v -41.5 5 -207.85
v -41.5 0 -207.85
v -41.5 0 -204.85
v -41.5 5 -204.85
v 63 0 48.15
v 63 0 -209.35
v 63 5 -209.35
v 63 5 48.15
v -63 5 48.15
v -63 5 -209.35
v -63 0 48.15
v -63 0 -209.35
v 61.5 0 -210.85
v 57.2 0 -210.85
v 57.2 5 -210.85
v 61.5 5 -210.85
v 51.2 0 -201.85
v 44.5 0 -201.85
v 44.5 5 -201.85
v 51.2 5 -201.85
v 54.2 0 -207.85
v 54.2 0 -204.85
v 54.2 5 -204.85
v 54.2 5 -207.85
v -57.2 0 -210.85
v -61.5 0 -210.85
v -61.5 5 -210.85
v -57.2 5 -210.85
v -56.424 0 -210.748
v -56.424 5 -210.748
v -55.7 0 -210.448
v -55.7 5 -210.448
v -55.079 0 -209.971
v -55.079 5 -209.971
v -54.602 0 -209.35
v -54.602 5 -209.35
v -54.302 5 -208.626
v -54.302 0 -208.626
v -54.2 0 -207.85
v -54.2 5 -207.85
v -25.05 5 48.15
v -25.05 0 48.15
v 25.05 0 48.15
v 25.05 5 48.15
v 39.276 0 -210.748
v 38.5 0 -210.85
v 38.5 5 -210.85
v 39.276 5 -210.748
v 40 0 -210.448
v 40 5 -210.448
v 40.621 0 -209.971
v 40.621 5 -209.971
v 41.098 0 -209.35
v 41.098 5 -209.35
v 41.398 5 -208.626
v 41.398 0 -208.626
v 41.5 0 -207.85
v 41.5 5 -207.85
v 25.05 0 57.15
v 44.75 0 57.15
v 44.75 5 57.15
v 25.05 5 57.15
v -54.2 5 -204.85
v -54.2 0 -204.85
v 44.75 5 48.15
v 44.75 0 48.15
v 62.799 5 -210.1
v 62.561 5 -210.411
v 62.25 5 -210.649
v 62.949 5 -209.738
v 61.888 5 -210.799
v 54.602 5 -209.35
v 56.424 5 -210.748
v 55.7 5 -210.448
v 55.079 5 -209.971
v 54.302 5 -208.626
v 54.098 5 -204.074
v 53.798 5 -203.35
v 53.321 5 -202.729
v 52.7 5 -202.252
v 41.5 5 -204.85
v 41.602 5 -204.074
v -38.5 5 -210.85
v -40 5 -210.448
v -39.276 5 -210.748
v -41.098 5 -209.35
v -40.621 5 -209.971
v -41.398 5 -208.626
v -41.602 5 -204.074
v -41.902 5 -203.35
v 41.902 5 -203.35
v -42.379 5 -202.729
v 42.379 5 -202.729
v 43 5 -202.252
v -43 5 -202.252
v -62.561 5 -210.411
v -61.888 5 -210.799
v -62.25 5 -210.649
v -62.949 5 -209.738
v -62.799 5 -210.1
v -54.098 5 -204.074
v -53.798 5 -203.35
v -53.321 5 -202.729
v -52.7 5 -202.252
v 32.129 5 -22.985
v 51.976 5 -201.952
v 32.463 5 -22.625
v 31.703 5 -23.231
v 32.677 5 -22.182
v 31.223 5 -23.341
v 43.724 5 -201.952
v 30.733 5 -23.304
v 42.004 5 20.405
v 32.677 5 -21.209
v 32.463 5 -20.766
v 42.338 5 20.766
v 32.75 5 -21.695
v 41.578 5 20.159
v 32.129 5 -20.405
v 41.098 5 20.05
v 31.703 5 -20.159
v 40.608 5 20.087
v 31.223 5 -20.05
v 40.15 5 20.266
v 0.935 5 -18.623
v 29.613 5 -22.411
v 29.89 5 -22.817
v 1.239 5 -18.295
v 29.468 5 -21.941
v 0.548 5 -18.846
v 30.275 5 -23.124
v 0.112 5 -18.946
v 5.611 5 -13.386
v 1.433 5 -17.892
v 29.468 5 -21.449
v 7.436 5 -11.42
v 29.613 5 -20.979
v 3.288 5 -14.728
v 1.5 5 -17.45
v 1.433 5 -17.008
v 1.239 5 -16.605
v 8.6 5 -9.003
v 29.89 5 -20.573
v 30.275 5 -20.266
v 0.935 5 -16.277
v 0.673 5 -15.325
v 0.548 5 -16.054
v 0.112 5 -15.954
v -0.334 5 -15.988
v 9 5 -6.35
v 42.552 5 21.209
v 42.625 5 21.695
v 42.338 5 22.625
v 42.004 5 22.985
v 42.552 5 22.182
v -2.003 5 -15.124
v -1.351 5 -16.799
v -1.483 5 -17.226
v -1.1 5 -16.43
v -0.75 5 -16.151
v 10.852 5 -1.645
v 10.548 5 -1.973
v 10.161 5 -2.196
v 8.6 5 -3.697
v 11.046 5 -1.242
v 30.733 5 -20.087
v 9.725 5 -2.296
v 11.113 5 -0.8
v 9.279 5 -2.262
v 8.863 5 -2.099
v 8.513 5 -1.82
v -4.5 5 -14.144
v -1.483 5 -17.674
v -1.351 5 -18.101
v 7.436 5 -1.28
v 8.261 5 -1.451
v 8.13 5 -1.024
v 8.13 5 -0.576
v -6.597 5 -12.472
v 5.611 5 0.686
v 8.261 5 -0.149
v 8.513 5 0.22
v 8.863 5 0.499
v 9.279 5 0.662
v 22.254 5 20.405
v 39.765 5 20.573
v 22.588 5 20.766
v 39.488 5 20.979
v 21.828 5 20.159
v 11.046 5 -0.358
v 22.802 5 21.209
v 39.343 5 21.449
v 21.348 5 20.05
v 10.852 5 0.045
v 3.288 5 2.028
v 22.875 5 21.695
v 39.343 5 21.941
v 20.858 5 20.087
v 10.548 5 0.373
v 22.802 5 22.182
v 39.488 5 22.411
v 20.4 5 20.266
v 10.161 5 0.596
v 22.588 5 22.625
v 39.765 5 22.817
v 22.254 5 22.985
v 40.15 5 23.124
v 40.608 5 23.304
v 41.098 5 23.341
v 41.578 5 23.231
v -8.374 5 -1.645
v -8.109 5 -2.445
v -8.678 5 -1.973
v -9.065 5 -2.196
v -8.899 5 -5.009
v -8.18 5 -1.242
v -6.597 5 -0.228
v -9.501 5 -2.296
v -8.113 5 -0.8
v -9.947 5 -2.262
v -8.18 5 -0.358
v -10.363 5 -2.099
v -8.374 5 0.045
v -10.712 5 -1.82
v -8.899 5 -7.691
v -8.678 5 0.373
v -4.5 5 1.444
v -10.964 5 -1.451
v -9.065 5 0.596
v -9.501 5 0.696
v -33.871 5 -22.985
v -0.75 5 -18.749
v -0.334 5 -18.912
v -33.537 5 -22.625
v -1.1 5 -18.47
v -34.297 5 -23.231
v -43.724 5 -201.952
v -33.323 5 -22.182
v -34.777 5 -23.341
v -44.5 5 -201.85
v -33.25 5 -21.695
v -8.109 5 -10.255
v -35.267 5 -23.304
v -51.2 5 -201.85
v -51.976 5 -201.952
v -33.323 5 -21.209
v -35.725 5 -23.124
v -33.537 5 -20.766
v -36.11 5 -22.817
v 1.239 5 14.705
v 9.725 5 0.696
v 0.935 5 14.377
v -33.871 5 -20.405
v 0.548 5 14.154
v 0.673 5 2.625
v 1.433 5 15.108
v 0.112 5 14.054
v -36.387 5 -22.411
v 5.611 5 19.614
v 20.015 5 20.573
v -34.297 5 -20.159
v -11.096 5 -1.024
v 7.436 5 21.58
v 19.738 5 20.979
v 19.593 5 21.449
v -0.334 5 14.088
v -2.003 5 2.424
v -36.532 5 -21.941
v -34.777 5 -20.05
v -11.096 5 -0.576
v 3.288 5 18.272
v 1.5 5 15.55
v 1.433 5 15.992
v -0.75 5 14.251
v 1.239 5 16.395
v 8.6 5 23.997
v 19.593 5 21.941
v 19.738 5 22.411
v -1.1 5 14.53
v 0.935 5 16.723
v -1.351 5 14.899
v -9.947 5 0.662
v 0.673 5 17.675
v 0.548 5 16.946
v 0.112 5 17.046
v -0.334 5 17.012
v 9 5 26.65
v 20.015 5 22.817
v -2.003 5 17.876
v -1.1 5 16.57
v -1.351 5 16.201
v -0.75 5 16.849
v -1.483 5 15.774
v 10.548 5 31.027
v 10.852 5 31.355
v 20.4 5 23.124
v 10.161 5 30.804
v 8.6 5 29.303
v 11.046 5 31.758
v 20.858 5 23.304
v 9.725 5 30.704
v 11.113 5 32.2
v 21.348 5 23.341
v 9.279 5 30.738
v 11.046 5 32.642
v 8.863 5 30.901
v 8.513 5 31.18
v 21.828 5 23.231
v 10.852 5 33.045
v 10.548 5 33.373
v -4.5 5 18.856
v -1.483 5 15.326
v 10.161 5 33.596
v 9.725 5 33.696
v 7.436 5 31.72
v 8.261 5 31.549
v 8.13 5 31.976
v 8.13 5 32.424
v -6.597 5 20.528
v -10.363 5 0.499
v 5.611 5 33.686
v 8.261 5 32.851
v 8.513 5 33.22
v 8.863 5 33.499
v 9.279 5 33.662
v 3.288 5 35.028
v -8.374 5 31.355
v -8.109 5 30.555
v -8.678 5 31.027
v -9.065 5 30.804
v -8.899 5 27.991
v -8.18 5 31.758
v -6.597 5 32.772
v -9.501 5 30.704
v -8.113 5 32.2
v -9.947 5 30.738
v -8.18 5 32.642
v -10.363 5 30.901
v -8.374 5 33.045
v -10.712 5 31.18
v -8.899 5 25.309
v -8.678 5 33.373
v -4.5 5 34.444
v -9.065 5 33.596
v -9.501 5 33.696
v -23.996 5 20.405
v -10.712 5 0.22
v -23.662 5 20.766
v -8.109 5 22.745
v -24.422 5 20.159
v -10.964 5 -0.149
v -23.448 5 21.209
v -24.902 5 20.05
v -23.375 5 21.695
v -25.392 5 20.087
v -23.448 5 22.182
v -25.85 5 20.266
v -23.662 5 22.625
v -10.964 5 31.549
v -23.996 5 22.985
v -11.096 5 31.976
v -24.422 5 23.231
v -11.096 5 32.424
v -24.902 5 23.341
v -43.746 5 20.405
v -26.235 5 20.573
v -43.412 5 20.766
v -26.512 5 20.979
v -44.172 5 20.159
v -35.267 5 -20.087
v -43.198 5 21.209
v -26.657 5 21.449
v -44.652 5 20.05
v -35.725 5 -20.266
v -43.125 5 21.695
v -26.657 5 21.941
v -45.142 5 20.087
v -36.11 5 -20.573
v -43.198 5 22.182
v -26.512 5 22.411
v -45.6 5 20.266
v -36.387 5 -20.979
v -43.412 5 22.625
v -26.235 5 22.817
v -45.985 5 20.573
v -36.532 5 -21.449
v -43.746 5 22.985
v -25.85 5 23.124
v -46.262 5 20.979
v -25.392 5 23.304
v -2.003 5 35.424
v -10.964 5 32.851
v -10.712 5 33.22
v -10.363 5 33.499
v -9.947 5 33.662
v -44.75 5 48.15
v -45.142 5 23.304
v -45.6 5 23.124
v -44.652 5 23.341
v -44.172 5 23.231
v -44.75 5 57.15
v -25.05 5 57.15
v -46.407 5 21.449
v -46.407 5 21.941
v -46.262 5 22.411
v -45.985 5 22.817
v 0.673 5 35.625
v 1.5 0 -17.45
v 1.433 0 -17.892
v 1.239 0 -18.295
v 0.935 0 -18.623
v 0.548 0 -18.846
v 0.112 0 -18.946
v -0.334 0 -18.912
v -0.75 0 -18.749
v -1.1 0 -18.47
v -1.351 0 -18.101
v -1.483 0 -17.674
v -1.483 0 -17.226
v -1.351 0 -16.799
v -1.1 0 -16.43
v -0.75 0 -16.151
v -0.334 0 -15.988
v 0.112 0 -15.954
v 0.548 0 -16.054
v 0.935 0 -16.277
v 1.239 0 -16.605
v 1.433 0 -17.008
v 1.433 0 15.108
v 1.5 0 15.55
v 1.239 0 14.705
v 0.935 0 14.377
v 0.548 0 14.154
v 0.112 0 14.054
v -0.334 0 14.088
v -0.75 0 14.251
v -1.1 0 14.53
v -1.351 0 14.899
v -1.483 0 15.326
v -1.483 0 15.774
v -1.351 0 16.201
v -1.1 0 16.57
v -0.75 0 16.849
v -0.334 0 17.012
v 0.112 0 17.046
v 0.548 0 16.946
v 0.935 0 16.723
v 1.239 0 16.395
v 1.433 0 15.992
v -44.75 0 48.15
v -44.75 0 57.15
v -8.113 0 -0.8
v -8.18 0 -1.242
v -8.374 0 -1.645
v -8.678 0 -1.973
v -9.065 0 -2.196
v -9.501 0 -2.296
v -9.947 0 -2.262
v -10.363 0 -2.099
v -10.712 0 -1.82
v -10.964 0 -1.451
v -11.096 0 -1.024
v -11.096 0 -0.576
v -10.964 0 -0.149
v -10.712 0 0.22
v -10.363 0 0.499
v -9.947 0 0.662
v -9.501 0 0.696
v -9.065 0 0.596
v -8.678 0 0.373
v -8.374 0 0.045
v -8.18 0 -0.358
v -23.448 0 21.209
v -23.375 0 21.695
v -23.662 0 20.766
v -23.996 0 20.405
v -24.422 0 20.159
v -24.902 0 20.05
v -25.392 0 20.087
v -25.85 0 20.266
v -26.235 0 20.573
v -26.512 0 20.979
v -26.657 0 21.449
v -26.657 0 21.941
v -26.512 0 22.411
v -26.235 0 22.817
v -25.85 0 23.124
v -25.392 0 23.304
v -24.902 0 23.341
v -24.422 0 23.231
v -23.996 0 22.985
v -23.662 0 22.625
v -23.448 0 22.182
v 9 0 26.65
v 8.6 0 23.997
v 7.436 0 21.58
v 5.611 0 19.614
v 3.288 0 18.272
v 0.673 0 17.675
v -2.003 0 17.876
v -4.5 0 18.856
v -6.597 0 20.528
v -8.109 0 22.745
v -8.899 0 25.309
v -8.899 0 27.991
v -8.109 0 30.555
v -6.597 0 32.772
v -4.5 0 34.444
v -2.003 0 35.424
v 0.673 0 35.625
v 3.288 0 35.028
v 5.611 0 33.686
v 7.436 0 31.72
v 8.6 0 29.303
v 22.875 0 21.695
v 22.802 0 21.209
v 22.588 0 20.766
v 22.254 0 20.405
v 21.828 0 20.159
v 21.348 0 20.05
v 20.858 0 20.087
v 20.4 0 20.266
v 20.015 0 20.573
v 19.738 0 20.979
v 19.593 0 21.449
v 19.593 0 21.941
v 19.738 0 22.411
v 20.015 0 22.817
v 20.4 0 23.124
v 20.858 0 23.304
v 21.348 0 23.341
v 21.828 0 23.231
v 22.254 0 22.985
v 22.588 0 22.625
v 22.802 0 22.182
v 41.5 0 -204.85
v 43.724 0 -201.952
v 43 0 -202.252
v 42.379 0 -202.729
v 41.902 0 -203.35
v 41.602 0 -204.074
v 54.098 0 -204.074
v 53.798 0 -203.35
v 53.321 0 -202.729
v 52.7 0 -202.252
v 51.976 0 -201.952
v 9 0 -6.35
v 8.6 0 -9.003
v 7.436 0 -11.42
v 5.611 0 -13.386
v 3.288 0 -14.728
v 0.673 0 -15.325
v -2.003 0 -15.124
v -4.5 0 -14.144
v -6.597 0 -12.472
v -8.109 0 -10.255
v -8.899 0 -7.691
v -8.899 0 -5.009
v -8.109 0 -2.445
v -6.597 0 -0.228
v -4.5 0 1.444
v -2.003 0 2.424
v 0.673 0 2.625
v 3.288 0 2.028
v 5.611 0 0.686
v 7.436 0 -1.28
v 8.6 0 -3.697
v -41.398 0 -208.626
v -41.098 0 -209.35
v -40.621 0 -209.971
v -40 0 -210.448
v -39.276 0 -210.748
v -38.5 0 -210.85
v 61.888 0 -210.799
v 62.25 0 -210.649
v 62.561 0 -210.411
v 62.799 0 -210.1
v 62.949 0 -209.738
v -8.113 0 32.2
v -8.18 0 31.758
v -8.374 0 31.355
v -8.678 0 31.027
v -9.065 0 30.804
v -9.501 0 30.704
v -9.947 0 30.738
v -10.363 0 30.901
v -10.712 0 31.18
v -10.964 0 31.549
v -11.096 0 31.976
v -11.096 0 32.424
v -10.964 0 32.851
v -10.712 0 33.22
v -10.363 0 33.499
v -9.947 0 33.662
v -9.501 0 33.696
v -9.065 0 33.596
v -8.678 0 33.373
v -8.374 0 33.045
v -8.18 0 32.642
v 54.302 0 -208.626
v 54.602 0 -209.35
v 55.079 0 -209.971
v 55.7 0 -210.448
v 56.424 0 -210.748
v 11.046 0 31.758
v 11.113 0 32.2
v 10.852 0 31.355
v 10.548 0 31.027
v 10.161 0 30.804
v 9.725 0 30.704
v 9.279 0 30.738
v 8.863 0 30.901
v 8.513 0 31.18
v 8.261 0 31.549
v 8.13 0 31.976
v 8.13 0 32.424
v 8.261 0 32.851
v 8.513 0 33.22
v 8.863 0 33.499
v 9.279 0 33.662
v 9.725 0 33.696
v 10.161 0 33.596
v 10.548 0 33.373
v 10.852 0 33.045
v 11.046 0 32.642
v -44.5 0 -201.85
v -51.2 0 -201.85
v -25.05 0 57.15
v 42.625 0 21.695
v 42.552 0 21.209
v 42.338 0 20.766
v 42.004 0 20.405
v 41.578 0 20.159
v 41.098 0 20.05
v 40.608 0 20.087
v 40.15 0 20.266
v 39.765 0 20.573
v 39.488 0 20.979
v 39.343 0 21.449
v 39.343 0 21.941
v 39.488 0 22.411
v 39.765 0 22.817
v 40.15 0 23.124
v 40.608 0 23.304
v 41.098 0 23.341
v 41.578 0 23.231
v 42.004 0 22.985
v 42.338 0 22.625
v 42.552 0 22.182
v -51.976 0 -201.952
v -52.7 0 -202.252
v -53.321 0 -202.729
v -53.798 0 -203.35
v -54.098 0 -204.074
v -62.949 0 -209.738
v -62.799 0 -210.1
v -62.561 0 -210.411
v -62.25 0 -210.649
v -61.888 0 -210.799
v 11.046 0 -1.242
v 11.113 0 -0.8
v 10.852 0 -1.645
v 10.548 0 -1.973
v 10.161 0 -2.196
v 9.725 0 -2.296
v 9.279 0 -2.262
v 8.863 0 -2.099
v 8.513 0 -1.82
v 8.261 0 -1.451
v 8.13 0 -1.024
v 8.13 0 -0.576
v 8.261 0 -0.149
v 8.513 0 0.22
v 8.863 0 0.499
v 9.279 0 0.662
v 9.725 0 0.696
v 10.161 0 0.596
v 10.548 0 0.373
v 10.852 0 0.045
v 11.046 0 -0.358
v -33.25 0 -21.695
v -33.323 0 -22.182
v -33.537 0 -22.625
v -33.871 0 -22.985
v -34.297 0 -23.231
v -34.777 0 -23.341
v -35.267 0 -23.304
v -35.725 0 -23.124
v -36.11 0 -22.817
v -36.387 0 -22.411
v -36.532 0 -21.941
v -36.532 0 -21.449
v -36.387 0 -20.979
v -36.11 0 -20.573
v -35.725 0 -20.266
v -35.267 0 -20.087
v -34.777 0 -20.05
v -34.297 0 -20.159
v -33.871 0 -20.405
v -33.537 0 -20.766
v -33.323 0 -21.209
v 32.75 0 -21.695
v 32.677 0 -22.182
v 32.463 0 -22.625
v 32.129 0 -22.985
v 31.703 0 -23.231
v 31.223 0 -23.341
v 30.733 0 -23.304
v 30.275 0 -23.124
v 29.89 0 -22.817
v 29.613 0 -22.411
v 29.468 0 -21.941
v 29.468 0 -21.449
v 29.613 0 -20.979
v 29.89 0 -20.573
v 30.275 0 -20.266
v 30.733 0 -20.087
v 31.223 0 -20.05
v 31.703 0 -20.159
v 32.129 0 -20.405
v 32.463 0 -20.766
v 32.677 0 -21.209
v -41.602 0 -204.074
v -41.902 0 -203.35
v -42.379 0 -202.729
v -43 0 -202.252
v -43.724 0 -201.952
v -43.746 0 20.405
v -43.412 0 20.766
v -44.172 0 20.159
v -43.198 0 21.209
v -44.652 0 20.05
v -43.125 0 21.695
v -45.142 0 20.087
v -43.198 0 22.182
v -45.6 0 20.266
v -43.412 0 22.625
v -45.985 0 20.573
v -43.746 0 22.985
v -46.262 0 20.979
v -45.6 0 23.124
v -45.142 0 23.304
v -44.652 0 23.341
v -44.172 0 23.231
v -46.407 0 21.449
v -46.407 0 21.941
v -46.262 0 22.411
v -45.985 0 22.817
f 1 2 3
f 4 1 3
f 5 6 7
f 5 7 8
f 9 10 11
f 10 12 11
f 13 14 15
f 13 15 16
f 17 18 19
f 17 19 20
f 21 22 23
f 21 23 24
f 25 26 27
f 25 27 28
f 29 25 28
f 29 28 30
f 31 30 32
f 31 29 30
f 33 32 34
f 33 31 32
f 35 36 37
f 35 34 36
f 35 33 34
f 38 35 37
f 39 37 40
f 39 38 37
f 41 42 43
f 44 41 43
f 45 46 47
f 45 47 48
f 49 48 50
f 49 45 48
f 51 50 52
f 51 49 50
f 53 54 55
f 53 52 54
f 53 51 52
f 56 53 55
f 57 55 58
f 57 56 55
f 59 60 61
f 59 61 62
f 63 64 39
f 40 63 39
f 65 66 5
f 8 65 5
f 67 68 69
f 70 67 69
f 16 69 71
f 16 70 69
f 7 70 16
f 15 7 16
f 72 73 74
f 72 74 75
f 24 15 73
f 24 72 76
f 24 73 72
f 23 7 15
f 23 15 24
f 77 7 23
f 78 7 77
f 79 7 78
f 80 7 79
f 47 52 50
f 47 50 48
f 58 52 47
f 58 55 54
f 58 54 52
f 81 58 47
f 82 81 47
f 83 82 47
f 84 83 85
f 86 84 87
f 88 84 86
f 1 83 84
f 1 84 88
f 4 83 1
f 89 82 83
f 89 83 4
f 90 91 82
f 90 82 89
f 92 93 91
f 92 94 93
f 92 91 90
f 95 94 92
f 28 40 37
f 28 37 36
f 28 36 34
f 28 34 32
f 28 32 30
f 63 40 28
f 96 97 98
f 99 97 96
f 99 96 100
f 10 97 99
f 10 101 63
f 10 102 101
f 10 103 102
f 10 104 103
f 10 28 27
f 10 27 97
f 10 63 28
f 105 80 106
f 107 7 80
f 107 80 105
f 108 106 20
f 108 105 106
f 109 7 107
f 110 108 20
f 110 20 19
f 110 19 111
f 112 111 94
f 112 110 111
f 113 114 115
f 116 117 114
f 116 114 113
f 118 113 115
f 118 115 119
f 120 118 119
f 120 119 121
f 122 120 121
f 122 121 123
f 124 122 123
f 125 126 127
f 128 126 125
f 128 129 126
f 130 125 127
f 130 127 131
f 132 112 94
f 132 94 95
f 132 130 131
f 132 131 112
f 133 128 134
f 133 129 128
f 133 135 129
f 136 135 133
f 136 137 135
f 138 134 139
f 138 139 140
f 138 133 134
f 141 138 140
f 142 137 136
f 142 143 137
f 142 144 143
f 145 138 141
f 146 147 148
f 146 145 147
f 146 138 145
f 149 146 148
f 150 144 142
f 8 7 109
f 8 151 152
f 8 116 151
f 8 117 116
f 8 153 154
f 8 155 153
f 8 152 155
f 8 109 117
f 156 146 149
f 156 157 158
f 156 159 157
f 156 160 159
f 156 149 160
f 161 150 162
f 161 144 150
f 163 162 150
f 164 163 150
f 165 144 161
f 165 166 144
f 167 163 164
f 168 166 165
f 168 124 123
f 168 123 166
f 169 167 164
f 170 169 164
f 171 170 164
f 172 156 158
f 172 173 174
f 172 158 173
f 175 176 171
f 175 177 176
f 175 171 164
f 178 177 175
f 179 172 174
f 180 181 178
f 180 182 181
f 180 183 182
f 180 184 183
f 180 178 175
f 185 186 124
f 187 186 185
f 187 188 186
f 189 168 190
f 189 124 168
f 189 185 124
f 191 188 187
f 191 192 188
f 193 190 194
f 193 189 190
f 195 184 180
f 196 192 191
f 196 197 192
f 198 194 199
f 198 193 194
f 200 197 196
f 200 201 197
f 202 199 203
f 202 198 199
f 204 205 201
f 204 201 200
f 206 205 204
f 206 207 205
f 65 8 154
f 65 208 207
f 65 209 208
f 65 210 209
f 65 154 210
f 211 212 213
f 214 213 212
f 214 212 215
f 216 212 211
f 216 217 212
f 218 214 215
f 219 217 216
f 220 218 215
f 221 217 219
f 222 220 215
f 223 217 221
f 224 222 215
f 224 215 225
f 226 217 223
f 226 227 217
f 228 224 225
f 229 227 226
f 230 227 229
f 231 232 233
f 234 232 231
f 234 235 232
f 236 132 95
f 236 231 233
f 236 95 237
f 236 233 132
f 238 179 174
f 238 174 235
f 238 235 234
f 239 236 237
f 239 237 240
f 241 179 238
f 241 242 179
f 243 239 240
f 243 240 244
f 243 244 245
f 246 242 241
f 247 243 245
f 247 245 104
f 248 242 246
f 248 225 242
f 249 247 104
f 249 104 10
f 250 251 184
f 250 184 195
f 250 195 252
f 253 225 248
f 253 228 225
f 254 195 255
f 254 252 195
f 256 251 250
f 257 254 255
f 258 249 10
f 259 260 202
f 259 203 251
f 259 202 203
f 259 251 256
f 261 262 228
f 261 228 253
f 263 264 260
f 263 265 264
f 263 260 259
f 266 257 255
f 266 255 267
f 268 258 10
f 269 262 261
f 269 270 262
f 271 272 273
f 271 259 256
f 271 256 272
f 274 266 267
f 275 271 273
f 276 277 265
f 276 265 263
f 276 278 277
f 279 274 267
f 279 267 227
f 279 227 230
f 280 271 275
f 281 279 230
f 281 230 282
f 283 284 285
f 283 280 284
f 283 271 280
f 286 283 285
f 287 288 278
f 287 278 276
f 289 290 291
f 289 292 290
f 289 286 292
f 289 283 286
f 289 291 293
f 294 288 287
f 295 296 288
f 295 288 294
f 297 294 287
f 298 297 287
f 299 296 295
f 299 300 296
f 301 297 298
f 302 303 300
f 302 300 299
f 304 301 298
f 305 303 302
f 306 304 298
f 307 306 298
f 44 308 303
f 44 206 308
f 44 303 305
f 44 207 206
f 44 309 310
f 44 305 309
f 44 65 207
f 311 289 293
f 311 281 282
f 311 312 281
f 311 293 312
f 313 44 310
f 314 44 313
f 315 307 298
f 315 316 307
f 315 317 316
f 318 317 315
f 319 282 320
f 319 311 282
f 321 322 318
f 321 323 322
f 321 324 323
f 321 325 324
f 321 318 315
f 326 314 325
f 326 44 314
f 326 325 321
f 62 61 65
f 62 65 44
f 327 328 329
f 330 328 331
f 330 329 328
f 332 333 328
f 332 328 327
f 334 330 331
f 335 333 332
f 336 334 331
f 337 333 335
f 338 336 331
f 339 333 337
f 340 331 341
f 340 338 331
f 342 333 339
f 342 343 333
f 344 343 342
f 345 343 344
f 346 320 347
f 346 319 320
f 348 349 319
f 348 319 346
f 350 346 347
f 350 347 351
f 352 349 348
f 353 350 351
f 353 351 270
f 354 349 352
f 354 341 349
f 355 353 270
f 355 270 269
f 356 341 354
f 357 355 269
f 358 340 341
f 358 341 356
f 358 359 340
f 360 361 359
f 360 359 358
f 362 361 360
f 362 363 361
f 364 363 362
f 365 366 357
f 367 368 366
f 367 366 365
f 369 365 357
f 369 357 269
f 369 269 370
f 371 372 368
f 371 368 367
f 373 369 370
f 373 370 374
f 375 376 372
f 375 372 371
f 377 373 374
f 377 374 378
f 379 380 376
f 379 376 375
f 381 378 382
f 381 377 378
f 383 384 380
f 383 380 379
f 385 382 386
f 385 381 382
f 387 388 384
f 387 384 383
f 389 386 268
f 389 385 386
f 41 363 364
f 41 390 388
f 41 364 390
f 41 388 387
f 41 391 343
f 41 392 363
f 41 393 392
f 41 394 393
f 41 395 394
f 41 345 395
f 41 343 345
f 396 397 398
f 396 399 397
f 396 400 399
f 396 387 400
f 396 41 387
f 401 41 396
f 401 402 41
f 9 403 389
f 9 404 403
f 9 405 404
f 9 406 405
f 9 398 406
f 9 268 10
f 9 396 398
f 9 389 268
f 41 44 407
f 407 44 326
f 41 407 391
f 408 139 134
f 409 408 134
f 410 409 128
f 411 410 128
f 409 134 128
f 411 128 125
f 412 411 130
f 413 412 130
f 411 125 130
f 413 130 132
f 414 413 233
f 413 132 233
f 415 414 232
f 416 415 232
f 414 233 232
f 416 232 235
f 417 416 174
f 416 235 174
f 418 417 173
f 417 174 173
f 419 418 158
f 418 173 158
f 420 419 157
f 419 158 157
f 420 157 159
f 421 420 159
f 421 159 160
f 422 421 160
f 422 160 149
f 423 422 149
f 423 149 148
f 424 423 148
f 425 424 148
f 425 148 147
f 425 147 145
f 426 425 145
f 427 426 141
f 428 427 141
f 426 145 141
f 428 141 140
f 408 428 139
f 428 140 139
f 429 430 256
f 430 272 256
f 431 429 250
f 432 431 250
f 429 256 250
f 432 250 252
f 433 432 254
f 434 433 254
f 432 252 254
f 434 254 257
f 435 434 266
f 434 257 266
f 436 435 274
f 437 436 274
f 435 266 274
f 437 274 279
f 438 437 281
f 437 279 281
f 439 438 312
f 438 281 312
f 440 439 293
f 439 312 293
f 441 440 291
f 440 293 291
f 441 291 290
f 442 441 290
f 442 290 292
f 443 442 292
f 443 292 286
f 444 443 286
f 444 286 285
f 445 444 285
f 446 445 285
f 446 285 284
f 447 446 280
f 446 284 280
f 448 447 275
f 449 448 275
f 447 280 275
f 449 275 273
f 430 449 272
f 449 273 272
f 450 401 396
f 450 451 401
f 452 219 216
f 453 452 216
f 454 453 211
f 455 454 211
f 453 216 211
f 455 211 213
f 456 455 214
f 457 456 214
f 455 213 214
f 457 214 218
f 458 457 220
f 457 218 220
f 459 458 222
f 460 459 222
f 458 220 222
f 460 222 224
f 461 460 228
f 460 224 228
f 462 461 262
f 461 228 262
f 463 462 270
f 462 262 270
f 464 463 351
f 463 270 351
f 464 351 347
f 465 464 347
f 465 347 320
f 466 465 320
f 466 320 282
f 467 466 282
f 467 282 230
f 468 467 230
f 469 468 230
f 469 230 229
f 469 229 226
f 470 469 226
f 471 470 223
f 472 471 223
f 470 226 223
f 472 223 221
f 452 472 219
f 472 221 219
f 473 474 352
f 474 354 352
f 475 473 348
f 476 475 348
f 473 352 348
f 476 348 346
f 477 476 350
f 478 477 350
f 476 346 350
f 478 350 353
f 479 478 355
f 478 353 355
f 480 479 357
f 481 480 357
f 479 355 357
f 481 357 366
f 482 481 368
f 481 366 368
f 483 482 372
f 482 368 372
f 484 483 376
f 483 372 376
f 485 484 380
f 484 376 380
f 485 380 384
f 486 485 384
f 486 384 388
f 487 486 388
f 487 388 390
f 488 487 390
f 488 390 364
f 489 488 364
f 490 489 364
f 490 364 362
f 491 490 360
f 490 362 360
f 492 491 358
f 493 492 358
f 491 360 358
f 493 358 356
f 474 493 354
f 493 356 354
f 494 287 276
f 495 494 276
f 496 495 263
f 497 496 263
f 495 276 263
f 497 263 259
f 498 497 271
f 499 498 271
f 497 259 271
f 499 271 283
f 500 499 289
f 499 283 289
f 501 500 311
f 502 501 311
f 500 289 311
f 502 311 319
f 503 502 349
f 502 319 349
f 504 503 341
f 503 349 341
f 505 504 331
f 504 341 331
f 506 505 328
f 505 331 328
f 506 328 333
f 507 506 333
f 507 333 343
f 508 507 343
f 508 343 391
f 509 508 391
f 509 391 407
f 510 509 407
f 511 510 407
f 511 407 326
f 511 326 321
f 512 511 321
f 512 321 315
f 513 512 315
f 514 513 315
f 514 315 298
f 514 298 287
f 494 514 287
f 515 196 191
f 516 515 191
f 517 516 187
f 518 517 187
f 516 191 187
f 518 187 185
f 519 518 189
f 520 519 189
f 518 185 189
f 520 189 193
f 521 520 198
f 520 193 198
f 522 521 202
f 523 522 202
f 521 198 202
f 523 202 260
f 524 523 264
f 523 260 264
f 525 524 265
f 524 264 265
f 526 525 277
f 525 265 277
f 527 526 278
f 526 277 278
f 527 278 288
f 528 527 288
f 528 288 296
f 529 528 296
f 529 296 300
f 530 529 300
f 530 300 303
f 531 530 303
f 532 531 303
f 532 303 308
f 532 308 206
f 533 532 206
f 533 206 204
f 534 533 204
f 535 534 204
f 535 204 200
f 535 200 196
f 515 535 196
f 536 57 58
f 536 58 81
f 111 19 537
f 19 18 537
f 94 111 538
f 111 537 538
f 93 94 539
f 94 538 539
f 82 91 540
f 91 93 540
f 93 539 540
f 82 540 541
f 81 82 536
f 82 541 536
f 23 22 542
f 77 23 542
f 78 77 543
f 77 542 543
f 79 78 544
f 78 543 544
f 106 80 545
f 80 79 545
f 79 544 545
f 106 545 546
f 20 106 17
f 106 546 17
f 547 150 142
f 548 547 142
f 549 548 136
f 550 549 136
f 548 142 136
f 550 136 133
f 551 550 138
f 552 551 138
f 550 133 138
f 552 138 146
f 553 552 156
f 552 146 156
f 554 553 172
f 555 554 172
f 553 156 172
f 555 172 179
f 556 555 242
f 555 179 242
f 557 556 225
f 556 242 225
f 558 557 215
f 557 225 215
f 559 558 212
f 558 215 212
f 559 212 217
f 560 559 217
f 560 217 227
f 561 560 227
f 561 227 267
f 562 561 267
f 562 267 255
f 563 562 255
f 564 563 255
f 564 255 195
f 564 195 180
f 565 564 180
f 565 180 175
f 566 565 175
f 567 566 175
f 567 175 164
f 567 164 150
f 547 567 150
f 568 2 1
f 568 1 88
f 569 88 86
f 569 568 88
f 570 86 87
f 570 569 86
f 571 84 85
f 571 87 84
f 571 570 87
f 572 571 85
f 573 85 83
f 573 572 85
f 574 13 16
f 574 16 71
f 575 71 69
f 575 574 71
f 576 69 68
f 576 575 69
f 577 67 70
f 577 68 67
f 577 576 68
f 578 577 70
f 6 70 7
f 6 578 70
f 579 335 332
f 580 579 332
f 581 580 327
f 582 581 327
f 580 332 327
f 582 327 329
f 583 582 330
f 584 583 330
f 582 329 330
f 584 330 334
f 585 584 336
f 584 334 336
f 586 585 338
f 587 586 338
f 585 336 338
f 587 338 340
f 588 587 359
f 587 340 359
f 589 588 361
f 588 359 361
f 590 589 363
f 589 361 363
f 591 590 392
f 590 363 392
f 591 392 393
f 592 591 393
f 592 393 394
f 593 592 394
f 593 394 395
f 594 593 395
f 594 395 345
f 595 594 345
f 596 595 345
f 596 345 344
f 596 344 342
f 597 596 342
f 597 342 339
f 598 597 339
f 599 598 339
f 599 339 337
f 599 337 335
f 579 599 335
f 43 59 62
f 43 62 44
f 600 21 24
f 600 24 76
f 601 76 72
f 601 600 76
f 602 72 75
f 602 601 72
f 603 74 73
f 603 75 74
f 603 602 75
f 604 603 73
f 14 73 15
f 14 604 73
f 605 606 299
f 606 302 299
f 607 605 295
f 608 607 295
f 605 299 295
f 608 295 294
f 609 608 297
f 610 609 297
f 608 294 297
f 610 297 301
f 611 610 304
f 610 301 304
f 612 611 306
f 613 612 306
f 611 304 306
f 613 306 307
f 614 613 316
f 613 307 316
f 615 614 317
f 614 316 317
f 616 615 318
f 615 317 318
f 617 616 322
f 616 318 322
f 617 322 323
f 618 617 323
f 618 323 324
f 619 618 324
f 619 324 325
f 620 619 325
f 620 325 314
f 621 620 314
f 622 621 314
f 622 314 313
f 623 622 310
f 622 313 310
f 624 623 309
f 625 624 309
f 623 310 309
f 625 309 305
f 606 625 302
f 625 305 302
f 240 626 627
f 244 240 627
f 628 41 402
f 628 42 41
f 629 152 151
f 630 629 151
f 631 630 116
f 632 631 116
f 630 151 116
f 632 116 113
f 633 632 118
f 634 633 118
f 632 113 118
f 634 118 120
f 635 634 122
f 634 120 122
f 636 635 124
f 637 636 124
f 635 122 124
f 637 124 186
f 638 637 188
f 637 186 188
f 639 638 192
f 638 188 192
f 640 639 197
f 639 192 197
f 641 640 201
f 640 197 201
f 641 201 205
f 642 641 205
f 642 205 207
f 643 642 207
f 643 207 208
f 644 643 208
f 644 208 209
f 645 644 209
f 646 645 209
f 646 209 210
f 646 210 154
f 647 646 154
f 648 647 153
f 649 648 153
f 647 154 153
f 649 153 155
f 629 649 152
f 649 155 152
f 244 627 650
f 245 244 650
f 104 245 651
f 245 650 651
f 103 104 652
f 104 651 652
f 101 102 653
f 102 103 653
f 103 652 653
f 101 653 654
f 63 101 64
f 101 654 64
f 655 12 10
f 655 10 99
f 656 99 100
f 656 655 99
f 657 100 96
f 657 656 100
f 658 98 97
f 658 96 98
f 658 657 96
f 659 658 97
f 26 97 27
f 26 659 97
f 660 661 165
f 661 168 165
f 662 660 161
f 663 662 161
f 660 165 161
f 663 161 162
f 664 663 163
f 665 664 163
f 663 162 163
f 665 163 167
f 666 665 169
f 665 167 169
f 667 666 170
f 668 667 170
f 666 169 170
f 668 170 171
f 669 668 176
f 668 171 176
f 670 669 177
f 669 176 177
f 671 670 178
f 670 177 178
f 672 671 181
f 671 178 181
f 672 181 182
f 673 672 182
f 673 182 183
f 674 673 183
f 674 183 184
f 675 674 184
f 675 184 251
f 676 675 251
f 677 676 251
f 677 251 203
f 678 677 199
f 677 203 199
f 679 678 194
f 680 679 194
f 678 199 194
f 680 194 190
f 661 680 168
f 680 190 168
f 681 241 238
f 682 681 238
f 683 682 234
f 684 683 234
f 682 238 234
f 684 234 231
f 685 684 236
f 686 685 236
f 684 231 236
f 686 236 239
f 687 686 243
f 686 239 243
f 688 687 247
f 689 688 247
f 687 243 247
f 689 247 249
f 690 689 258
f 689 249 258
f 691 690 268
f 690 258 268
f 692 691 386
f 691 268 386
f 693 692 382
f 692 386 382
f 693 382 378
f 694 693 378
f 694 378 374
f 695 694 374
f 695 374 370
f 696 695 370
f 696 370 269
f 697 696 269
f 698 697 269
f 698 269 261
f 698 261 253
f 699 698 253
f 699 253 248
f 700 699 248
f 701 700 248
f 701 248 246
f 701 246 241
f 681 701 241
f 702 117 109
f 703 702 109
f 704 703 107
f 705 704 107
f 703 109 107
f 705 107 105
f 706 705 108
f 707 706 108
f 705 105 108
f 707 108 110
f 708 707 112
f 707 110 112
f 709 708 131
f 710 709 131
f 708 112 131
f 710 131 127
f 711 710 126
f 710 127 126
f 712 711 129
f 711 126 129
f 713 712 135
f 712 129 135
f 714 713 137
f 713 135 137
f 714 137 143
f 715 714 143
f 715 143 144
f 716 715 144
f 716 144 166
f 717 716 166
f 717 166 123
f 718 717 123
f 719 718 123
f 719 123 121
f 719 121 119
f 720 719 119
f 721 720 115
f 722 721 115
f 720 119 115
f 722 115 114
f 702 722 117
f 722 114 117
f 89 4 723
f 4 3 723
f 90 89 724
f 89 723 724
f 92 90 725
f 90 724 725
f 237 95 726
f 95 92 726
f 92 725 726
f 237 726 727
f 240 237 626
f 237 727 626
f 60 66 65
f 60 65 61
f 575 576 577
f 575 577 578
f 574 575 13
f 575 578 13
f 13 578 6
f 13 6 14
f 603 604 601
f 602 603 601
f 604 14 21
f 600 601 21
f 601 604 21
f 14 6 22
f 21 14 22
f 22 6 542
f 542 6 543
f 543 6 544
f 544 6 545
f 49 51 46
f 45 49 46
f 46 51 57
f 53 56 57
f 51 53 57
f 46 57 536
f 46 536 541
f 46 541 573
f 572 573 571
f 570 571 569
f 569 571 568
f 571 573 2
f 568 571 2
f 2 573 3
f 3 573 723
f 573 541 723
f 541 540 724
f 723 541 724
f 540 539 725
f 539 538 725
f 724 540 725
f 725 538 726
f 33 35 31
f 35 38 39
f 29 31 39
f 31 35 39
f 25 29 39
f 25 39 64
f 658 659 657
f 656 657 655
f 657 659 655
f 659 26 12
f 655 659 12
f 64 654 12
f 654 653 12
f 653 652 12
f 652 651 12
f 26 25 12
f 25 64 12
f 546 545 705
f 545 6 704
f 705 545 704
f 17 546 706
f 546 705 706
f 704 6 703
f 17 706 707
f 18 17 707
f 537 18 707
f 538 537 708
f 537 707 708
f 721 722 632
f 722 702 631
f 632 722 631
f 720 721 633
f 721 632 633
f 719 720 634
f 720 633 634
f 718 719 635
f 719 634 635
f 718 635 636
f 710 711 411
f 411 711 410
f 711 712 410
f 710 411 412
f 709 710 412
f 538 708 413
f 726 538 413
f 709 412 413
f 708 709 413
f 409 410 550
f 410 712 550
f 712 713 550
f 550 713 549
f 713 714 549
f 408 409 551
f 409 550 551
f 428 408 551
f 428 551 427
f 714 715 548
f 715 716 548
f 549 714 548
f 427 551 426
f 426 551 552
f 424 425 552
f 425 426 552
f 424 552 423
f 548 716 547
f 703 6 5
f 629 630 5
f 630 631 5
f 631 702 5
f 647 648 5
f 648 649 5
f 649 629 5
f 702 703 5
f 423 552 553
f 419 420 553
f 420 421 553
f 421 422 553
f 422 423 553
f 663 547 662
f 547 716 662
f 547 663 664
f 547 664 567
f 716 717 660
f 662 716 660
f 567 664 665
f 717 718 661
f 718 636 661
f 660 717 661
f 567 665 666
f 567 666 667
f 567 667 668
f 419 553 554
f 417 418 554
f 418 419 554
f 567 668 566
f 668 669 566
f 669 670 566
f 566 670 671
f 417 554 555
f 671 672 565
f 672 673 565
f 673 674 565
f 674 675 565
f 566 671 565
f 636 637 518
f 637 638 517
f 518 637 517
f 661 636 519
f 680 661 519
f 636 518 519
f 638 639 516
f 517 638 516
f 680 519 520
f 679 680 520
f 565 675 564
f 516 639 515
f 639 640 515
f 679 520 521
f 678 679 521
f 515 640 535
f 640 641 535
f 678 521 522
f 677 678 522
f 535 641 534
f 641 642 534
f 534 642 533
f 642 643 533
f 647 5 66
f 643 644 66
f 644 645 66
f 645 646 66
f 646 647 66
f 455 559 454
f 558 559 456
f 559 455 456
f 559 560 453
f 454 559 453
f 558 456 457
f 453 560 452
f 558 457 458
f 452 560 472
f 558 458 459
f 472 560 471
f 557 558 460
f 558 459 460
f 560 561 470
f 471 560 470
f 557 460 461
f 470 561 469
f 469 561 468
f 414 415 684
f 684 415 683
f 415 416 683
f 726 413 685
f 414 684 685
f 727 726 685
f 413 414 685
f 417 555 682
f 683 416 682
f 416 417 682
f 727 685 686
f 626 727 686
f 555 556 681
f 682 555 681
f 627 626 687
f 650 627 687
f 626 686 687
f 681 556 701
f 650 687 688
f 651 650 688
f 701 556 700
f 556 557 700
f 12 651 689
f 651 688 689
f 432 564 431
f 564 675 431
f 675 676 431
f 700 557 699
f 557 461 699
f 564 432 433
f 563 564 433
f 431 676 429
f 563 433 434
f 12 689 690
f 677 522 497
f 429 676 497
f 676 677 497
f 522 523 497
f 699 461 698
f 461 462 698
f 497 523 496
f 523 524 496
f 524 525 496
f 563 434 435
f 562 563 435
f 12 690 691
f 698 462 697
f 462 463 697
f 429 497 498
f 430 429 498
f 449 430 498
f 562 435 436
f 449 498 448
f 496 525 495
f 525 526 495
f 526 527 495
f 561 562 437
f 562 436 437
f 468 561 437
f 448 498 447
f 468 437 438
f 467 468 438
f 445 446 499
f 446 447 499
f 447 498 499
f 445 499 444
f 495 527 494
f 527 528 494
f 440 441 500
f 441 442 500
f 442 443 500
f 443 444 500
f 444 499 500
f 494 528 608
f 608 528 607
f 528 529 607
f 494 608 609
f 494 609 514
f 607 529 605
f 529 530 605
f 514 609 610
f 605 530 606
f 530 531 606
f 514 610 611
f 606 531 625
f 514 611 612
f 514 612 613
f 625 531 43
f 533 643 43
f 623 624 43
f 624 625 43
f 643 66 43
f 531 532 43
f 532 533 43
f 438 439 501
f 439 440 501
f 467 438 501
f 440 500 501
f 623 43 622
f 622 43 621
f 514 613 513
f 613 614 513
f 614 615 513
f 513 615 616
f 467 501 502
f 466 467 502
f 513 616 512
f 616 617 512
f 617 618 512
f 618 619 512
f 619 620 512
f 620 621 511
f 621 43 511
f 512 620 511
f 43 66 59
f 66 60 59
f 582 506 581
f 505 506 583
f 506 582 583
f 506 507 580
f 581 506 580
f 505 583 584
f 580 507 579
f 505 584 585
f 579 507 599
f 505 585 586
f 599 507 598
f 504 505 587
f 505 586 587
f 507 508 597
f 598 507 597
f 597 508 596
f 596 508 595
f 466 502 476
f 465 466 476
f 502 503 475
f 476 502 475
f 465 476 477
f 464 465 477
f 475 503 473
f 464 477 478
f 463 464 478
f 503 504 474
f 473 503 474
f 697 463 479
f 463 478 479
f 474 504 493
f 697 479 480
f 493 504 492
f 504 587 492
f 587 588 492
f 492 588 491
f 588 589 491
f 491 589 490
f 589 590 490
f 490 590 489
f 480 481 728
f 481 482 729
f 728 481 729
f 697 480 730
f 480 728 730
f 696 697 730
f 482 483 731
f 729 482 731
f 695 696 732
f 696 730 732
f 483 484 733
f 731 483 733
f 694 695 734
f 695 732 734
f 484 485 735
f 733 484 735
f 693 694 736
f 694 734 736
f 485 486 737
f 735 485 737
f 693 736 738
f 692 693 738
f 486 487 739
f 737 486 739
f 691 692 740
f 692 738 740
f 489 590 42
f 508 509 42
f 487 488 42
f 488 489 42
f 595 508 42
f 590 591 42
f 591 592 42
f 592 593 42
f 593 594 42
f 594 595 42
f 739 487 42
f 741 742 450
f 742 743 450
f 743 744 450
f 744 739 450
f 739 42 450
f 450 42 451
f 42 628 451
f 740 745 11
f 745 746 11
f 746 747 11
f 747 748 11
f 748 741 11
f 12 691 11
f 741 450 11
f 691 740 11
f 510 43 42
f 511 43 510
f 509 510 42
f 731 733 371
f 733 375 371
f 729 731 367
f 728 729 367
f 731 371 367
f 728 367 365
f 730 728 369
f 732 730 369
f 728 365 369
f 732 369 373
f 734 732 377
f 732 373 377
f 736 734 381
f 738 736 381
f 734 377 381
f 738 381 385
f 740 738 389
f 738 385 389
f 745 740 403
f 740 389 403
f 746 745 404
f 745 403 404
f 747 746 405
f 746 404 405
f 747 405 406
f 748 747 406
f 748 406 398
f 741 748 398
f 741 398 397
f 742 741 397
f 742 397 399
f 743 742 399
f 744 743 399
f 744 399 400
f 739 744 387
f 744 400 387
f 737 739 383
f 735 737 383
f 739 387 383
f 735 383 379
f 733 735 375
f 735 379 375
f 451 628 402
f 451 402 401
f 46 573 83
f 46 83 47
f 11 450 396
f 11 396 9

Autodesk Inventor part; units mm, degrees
ref_plane "YZ Plane" through (0, 0, 0) normal (1, 0, 0) x (0, 1, 0)
ref_plane "XZ Plane" through (0, 0, 0) normal (0, 1, 0) x (-1, 0, 0)
ref_plane "XY Plane" through (0, 0, 0) normal (0, 0, 1) x (1, 0, 0)
sketch "Sketch1" plane through (0, 0, 0) normal (0, 1, 0) x (-1, 0, 0)
  line L0 (-41.5, -207.85) -> (-41.5, -204.85)
  line L1 (-44.5, -201.85) -> (-51.2, -201.85)
  line L2 (-54.2, -204.85) -> (-54.2, -207.85)
  line L3 (-57.2, -210.85) -> (-61.5, -210.85)
  arc A0 (-41.5, -207.85) -> (-38.5, -210.85) centre (-38.5, -207.85) ccw
  arc A1 (-41.5, -204.85) -> (-44.5, -201.85) centre (-44.5, -204.85) ccw
  arc A2 (-51.2, -201.85) -> (-54.2, -204.85) centre (-51.2, -204.85) ccw
  arc A3 (-57.2, -210.85) -> (-54.2, -207.85) centre (-57.2, -207.85) ccw
  line L4 (41.5, -207.85) -> (41.5, -204.85)
  line L5 (44.5, -201.85) -> (51.2, -201.85)
  line L6 (54.2, -204.85) -> (54.2, -207.85)
  line L7 (61.5, -210.85) -> (57.2, -210.85)
  line L8 (38.5, -210.85) -> (-38.5, -210.85)
  arc A4 (54.2, -207.85) -> (57.2, -210.85) centre (57.2, -207.85) ccw
  arc A5 (54.2, -204.85) -> (51.2, -201.85) centre (51.2, -204.85) ccw
  arc A6 (44.5, -201.85) -> (41.5, -204.85) centre (44.5, -204.85) ccw
  arc A7 (38.5, -210.85) -> (41.5, -207.85) centre (38.5, -207.85) ccw
  line L9 (44.75, 48.15) -> (25.05, 48.15)
  line L10 (25.05, 48.15) -> (25.05, 57.15)
  line L11 (25.05, 57.15) -> (44.75, 57.15)
  line L12 (44.75, 57.15) -> (44.75, 48.15)
  line L13 (-25.05, 48.15) -> (-44.75, 48.15)
  line L14 (-44.75, 48.15) -> (-44.75, 57.15)
  line L15 (-44.75, 57.15) -> (-25.05, 57.15)
  line L16 (-25.05, 57.15) -> (-25.05, 48.15)
  line L17 (44.75, 48.15) -> (63, 48.15)
  line L18 (25.05, 48.15) -> (-25.05, 48.15)
  line L19 (-44.75, 48.15) -> (-63, 48.15)
  line L20 (63, -209.35) -> (63, 48.15)
  line L21 (-63, -209.35) -> (-63, 48.15)
  arc A8 (61.5, -210.85) -> (63, -209.35) centre (61.5, -209.35) ccw
  arc A9 (-63, -209.35) -> (-61.5, -210.85) centre (-61.5, -209.35) ccw
  point P0 (0, 0)
  point P1 (-47.85, -207.15)
  point P2 (47.85, -207.85)
  point P3 (34.9, 57.15)
  point P4 (-34.9, 57.15)
  point P5 (-59.35, -210.85)
  point P6 (0, -210.85)
  point P7 (59.35, -210.85)
  point P8 (0, 48.15)
  point P9 (-47.85, -201.85)
  point P10 (47.85, -201.85)
  dimension "d3" = 12.7
  dimension "d5" = 3
  dimension "d7" = 12.7
  dimension "d9" = 3
  dimension "d10" = 9
  dimension "d11" = 19.7
  dimension "d13" = 9
  dimension "d14" = 19.7
  dimension "d16" = 1.5
  dimension "d17" = 126
  dimension "d20" = 18.25
  dimension "d21" = 18.25
  dimension "d22" = 57.15
  dimension "d23" = 9
  dimension "d24" = 9
  dimension "d27" = 250
  dimension "d28" = 250
  dimension "d53" = 83
  dimension "d54" = 3.7
extrude "base" add sketch "Sketch1" along normal blind 5
sketch "Sketch2" plane through (0, 5, 0) normal (0, 1, 0) x (1, 0, 0)
  circle A0 centre (0, -26.65) radius 9
  line L0 (-25.05, -48.15) -> (25.05, -48.15) projected
  line L1 (0, -26.65) -> (-33, -26.65) construction
  point P0 (0, 0)
  dimension "d31" = 18
  dimension "d32" = 21.5
  dimension "d52" = 33
extrude "Poke Hole" cut sketch "Sketch2" against normal up to surface (5 mm away)
pattern_linear "Rectangular Pattern1" count 2 spacing 33 along (0, 0, -1) of "Poke Hole"
sketch "Sketch3" plane through (0, 5, 0) normal (0, 1, 0) x (1, 0, 0)
  circle A0 centre (0, 17.45) radius 1.5
  circle A1 centre (0, 6.35) radius 9 projected
  circle A2 centre (-9.6129, 0.8) radius 1.5
  circle A3 centre (9.6129, 0.8) radius 1.5
  point P0 (0, 0)
  point P1 (0, 6.35)
  dimension "d41" = 3
  dimension "d42" = 11.1
  dimension "d45" = 360
extrude "Mount Holes" cut sketch "Sketch3" against normal up to surface (5 mm away) contours A0 | A2 | A3
pattern_linear "Rectangular Pattern2" count 2 spacing 33 along (0, 0, 1) of "Mount Holes"
sketch "Sketch4" plane through (0, 5, 0) normal (0, 1, 0) x (1, 0, 0)
  circle A0 centre (-44.775, -21.6952) radius 1.65
  circle A1 centre (-25.025, -21.6952) radius 1.65
  line L0 (-44.775, -21.6952) -> (-25.025, -21.6952) construction
  circle A2 centre (0, 17.45) radius 1.5 construction
  circle A3 centre (-34.9, 21.6952) radius 1.65
  line L1 (-63, 209.35) -> (-63, -48.15) projected
  line L2 (-25.05, -48.15) -> (25.05, -48.15) construction
  line L3 (-44.75, -48.15) -> (-25.05, -48.15) construction
  line L4 (-44.775, -21.6952) -> (-25.025, -21.6952) construction
  line L5 (-34.9, 21.6952) -> (-34.9, -21.6952) construction
  point P0 (0, 0)
  point P1 (-34.9, -48.15)
  point P2 (-34.9, 0)
  dimension "d55" = 3.3
  dimension "d56" = 3.3
  dimension "d57" = 19.75
  dimension "d58" = 3.3
  dimension "d59" = 44.5
extrude "PCB mount holes" cut sketch "Sketch4" against normal up to surface (5 mm away)
pattern_linear "Rectangular Pattern3" count 2 spacing 66 along (1, 0, 0) of "PCB mount holes"
equation "\"d7\" = d3"
equation "\"d9\" = d5"
equation "\"d10\" = d23"
equation "\"d13\" = d23"
equation "\"d14\" = d11"
equation "\"d21\" = d20"
equation "\"d24\" = d23"
equation "\"d37\" = d52"
equation "\"d40\" = d52"
equation "\"d51\" = d52"
equation "\"d56\" = d55"
equation "\"d58\" = d55"
equation "\"d66\" = 2 * d52"
properties part number "front_wall_2poke" material "PPS Plastic"
